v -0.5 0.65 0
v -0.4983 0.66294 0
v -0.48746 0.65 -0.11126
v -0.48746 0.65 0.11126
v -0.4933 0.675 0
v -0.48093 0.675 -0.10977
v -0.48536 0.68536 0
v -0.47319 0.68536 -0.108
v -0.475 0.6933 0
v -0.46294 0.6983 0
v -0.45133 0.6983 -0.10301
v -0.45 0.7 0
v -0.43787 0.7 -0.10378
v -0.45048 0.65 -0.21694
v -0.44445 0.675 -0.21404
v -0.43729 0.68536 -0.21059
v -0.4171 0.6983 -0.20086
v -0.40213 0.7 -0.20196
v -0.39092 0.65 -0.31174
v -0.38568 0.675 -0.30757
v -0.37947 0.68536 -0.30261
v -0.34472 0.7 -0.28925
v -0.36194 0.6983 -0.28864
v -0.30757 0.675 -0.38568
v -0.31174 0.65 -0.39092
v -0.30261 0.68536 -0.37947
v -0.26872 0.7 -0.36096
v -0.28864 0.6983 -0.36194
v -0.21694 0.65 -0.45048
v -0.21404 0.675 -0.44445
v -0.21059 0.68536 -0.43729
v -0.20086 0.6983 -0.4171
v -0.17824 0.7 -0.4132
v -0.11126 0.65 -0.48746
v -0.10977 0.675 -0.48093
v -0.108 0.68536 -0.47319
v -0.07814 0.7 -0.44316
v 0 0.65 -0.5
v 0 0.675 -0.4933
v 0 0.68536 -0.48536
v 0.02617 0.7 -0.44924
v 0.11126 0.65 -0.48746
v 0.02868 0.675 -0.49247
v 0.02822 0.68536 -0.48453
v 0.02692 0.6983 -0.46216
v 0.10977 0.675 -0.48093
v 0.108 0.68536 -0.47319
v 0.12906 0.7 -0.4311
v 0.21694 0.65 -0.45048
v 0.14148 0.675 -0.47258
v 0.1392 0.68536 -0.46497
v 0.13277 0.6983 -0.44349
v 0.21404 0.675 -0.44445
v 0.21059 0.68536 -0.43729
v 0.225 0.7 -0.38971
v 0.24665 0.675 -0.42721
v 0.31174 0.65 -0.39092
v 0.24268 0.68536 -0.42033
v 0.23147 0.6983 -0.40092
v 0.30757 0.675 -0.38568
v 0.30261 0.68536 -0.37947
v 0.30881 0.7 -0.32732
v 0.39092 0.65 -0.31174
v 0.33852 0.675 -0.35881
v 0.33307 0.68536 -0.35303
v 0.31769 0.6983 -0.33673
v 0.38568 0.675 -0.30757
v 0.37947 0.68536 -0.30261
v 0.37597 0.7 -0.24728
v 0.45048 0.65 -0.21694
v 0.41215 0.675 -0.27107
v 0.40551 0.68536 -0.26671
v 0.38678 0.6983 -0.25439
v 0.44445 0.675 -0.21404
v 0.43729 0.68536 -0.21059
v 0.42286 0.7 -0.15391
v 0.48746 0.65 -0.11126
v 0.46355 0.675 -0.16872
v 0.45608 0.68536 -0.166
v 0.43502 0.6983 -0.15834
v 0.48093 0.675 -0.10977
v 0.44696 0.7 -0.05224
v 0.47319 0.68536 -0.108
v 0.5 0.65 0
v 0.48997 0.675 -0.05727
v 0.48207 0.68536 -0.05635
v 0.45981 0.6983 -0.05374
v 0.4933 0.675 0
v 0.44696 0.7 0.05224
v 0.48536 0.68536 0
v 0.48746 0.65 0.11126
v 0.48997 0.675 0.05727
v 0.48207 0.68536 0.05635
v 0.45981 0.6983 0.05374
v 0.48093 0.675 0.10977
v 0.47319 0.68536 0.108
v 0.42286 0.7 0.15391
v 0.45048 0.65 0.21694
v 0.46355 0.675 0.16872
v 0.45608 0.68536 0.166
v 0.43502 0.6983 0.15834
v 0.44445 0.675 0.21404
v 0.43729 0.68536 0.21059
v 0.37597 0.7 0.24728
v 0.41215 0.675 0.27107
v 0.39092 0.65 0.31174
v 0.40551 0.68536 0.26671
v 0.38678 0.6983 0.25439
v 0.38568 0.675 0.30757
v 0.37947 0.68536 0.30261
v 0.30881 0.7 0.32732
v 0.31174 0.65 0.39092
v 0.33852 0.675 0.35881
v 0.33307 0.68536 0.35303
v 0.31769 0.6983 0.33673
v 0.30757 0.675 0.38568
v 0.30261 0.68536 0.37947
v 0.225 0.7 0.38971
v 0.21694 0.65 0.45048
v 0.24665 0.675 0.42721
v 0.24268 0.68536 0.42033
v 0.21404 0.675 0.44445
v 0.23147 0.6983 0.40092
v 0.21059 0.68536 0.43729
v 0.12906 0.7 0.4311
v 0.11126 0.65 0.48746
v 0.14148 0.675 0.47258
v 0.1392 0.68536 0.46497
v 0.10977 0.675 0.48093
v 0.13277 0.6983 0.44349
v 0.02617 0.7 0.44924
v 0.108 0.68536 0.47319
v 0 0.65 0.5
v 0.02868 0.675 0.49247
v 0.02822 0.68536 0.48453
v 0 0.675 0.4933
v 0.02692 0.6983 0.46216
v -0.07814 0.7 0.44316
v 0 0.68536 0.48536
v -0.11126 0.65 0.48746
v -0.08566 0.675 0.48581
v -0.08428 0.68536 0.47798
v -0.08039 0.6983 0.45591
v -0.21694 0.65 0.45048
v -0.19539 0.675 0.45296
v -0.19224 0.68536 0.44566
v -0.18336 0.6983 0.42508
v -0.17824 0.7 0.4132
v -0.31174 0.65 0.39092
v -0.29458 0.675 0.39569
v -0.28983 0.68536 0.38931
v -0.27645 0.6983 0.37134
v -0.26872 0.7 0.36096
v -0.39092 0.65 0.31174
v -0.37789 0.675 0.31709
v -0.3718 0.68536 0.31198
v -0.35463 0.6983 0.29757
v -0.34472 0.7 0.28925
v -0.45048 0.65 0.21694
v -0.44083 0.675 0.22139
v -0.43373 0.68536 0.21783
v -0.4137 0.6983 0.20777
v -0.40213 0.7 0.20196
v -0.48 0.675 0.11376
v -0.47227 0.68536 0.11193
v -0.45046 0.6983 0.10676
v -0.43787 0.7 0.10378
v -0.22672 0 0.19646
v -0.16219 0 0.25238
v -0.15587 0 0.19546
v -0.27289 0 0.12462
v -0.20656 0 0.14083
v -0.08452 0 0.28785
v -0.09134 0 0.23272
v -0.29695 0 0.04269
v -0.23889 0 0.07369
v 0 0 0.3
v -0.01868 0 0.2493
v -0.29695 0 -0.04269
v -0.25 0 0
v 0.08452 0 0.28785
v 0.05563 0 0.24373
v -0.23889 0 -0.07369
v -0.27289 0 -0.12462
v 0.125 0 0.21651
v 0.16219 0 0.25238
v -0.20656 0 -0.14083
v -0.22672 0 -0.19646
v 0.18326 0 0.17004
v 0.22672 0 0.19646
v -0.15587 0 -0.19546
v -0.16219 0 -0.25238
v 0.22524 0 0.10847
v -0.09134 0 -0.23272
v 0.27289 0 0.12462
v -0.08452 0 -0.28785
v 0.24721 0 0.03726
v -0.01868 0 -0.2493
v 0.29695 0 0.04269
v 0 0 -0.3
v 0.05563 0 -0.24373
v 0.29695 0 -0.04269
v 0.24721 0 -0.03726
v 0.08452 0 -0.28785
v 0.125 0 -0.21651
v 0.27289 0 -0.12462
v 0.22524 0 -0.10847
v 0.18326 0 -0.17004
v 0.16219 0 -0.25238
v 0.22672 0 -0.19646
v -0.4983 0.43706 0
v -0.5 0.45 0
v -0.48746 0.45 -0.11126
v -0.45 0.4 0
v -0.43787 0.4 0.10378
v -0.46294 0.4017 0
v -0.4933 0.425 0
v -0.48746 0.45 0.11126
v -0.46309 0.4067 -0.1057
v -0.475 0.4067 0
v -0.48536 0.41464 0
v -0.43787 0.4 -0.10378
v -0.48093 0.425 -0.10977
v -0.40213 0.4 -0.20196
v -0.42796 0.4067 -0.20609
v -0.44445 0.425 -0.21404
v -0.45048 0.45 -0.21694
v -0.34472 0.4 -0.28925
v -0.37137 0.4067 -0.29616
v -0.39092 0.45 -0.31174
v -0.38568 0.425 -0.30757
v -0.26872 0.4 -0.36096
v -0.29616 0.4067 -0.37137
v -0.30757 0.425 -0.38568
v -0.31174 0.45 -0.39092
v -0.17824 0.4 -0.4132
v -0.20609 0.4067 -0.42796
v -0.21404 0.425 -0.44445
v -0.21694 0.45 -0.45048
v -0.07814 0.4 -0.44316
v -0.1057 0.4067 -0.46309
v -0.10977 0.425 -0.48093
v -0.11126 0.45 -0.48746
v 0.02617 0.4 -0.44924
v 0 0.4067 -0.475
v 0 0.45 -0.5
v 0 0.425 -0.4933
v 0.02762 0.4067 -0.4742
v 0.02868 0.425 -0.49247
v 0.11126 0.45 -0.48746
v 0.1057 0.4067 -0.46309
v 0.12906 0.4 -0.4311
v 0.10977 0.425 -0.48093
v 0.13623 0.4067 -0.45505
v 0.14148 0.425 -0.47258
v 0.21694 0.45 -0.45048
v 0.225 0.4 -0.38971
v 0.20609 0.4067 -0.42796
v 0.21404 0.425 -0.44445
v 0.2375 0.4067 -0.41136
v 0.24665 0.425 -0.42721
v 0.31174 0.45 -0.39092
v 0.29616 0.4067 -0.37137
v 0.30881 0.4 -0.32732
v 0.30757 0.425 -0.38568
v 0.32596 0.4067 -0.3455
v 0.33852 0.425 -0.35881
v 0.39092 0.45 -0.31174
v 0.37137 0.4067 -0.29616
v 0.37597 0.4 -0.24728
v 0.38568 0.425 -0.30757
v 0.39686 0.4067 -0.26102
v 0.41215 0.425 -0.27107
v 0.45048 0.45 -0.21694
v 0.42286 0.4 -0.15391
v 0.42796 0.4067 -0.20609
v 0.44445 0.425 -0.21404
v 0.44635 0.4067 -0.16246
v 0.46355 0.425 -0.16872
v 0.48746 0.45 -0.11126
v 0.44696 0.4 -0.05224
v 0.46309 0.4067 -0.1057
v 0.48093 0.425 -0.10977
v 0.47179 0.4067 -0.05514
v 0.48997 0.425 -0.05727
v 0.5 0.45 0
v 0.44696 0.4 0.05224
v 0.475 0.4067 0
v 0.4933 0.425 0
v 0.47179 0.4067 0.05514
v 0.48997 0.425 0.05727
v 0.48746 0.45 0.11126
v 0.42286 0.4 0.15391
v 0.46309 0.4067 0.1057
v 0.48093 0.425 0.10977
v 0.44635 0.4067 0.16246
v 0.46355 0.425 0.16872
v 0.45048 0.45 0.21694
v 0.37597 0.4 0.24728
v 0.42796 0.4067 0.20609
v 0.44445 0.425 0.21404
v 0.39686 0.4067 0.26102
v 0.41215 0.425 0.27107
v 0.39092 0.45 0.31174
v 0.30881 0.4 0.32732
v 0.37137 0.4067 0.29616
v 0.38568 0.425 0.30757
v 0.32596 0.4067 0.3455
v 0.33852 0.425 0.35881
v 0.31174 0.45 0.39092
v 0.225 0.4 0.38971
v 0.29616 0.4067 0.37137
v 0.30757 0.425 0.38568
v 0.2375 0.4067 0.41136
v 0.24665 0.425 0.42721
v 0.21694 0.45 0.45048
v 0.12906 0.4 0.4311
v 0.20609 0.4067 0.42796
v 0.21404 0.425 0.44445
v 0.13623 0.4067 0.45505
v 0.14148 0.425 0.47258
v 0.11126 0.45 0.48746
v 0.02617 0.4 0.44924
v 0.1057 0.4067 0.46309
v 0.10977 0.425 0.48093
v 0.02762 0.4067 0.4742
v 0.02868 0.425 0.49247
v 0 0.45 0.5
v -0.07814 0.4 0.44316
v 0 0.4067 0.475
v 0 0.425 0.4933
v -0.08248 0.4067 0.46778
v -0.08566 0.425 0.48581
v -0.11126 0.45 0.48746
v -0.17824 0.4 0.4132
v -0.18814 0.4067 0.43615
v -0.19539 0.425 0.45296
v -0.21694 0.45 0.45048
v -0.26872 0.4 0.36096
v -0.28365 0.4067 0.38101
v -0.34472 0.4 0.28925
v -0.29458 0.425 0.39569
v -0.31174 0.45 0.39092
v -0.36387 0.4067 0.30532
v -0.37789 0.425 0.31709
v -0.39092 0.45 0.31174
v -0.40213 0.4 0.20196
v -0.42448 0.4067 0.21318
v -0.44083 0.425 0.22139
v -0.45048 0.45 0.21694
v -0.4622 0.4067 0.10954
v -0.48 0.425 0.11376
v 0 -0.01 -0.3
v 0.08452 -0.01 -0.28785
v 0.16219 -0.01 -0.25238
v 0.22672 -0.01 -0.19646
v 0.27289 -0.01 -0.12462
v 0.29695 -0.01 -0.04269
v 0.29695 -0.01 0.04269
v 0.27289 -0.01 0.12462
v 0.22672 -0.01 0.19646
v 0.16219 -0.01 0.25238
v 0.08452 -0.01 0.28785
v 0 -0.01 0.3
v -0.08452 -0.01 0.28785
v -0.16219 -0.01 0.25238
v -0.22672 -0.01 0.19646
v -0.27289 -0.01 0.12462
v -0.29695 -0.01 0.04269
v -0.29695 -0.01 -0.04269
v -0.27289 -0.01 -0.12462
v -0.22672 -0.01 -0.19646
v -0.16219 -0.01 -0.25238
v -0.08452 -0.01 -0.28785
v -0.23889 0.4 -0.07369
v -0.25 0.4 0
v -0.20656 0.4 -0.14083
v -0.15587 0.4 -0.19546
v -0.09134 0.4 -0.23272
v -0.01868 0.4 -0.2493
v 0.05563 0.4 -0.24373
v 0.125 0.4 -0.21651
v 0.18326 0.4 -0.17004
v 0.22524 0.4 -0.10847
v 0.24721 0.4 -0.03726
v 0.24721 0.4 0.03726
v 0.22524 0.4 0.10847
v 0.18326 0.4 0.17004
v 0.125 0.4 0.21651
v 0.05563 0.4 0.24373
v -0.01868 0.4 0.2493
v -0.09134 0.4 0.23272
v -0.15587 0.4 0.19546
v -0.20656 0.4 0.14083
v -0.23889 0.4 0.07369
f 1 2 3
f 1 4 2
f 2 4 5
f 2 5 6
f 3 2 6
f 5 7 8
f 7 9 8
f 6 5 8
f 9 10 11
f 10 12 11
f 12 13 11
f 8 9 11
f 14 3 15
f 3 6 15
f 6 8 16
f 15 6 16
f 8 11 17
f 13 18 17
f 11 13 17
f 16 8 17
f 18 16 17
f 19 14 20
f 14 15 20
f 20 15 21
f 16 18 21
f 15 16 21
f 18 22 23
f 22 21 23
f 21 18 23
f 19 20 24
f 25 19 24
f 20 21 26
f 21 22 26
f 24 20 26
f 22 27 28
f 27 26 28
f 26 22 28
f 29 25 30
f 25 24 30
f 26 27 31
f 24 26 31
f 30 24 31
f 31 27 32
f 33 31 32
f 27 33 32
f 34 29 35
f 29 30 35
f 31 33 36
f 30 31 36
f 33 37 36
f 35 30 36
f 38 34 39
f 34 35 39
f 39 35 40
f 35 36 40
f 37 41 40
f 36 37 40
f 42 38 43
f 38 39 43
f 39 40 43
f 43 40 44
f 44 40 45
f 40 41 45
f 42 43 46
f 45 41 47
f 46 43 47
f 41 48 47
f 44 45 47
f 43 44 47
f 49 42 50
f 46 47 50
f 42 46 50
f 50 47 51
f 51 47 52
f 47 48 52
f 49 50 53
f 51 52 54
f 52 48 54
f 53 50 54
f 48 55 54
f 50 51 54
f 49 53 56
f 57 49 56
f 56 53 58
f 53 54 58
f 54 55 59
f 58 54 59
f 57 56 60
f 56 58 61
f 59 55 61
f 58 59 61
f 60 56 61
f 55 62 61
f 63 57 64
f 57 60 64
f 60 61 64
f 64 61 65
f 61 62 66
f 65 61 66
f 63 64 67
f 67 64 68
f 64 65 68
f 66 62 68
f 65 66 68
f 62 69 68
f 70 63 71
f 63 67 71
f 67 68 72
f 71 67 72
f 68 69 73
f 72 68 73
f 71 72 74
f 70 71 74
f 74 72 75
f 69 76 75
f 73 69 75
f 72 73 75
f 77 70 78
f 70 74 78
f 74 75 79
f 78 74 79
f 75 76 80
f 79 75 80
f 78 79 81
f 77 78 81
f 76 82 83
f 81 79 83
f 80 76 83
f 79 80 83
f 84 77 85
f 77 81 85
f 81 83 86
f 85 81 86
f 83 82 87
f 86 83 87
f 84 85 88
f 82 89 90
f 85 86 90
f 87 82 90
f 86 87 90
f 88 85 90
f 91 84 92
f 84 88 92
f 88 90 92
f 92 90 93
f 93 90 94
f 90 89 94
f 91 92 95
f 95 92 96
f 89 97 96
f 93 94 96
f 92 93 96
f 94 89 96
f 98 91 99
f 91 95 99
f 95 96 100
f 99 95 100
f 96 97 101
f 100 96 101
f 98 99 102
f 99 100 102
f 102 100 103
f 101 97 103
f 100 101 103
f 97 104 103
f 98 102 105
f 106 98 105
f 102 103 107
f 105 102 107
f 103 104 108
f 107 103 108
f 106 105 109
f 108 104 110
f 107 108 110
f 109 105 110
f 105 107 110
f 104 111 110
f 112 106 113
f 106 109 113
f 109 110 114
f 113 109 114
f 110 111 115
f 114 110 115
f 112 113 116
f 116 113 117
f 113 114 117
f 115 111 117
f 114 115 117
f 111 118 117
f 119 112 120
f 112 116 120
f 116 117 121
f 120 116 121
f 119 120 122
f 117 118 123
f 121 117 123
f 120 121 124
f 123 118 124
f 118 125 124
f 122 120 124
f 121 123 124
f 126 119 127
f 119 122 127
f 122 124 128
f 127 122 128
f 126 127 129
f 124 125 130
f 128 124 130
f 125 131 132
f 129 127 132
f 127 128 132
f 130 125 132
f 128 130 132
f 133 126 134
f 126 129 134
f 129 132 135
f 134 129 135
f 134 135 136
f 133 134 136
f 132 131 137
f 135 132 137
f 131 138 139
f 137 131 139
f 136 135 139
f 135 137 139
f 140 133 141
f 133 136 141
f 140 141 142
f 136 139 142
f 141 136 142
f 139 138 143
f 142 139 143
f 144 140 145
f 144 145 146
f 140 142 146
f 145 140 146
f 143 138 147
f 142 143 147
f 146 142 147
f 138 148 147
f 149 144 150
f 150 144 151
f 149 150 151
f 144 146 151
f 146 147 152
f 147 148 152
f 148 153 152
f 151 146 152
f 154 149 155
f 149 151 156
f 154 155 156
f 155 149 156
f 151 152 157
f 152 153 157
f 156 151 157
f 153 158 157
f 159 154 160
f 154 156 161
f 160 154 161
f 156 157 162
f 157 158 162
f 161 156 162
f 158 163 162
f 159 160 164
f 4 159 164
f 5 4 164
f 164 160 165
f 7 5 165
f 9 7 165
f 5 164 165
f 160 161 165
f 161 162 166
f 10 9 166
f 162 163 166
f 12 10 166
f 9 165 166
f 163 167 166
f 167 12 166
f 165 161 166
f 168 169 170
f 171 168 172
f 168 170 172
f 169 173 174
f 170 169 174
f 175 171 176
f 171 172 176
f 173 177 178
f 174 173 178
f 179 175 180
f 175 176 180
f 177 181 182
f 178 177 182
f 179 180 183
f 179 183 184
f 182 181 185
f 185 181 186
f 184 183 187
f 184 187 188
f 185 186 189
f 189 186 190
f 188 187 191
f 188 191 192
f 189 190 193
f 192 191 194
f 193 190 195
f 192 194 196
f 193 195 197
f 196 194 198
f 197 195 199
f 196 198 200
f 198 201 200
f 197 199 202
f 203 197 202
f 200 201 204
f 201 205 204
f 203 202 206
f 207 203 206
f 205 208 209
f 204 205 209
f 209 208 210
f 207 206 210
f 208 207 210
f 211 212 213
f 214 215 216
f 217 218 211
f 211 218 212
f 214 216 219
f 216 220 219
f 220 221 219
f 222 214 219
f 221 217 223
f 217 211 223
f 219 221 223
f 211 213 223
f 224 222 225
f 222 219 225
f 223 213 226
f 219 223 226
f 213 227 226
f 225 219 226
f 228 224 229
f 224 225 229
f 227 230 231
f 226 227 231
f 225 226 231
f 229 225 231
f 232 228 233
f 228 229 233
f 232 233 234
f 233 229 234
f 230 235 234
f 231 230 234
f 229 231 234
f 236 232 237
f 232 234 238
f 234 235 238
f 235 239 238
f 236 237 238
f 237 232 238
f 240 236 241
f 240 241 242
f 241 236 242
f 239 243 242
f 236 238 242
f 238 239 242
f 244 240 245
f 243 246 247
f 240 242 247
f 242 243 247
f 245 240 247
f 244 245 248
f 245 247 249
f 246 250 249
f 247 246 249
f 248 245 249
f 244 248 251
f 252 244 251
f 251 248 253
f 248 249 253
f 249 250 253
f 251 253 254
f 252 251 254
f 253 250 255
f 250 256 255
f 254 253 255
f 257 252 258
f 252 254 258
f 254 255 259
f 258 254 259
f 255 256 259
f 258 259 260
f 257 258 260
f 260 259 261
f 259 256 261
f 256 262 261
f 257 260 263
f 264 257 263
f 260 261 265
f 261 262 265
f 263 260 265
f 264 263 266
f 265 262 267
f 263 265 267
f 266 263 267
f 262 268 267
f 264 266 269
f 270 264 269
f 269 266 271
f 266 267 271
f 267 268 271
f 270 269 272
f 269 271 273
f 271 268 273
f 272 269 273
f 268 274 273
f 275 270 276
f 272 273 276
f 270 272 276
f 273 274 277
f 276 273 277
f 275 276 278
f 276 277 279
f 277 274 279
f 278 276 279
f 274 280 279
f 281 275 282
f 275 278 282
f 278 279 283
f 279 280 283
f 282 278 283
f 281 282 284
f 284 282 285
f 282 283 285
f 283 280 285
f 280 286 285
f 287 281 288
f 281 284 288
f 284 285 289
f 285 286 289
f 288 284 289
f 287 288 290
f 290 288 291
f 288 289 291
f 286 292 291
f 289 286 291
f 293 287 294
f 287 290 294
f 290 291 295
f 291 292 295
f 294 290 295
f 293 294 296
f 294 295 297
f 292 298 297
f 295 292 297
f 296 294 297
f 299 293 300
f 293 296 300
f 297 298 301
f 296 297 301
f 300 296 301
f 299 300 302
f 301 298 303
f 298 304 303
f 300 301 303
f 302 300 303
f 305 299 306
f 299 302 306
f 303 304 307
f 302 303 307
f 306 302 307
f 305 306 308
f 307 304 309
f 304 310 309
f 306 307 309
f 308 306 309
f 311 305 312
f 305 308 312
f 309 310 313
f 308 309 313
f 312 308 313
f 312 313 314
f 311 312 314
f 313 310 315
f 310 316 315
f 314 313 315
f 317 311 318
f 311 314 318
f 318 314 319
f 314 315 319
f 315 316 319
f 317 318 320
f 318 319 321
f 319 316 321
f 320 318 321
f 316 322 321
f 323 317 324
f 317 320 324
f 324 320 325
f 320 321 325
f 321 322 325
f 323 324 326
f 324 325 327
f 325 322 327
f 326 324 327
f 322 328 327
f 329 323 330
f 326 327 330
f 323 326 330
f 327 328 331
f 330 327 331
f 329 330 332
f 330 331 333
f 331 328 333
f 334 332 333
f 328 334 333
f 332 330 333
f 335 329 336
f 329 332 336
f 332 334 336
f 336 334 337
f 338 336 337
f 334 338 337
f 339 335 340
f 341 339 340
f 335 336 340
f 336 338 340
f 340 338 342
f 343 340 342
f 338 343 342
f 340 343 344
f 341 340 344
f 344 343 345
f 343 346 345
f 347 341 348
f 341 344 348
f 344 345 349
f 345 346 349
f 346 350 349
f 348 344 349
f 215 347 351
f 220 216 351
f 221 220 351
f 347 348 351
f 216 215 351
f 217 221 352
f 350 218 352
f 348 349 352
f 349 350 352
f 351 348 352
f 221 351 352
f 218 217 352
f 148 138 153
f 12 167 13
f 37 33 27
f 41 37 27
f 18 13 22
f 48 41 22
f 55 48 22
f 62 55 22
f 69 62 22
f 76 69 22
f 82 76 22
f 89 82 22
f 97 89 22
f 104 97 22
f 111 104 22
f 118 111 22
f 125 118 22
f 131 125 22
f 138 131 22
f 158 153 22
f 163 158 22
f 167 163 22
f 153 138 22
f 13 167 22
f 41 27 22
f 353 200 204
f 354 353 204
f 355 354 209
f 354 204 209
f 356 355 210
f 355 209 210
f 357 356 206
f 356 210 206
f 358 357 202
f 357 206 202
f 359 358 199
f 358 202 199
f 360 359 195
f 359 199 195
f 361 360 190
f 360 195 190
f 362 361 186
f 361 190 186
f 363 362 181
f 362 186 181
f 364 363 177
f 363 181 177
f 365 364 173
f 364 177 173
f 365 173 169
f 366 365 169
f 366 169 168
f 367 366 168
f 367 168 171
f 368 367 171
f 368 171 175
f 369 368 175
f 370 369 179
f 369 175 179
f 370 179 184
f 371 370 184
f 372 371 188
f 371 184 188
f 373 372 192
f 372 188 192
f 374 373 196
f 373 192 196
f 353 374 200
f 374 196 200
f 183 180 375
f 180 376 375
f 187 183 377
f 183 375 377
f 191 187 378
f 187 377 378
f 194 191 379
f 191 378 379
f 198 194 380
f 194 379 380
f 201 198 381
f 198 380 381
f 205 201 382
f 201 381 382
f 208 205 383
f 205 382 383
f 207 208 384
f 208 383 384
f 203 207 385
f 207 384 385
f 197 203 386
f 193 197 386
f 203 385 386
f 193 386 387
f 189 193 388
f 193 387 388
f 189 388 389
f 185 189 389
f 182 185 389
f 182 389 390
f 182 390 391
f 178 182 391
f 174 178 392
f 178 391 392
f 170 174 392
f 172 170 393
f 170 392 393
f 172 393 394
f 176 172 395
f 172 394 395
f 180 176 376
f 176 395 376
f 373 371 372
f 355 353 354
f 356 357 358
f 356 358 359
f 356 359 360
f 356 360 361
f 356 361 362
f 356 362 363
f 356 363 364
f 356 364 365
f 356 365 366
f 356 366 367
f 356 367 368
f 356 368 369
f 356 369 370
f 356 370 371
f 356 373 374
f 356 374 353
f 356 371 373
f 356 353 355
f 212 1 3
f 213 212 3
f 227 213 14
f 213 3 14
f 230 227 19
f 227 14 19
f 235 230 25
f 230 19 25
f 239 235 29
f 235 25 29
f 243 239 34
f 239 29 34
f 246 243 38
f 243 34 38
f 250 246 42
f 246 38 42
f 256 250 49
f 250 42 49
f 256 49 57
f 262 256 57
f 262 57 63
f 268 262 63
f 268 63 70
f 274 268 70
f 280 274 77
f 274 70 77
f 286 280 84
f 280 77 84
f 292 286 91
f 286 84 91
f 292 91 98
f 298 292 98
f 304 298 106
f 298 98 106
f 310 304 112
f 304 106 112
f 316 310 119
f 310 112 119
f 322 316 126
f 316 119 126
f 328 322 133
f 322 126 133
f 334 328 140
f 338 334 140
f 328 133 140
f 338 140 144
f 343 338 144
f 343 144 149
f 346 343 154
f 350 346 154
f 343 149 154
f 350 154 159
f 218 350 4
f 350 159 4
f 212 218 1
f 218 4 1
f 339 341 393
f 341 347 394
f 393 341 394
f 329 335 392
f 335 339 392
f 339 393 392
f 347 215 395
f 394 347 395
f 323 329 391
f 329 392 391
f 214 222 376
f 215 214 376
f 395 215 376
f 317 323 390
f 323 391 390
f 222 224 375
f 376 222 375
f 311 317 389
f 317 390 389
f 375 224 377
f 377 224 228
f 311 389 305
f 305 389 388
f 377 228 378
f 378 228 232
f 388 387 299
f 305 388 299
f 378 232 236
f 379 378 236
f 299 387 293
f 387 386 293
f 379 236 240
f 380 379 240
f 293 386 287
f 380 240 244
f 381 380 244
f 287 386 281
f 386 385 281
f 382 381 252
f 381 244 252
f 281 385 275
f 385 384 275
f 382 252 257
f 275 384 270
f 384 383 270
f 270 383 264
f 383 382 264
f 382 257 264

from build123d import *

# Parameters (mm, degrees)
FILLET1_R           = 0.05
SKETCH2_R           = 0.3
BOSS_EXTRUDE1_DEPTH = 0.01


with BuildPart() as part:
    # Sketch1 → Revolve1 (revolve)
    with BuildSketch(Plane.XY, mode=Mode.PRIVATE) as revolve1_sk:
        Polygon((0, 0), (0.25, 0), (0.25, 0.4), (0.5, 0.4), (0.5, 0.7), (0, 0.7), align=None)
    revolve(revolve1_sk.sketch.rotate(Axis((0, 0.7, 0), (0, -1, 0)), 180), axis=Axis((0, 0.7, 0), (0, -1, 0)))

    # Fillet1
    fillet1_edges = [part.edges().sort_by_distance(p)[0] for p in [
        (0.5, 0.7, 0),
        (0.5, 0.4, 0),
    ]]
    fillet(fillet1_edges, radius=FILLET1_R)

    # Sketch2 → Boss-Extrude1 (add)
    with BuildSketch(Plane(origin=(0, 0, 0), x_dir=(-1, 0, 0), z_dir=(0, -1, 0))):
        with Locations(Location((0, 0, 0), (0, 0, 90))):
            Circle(SKETCH2_R)
    extrude(amount=BOSS_EXTRUDE1_DEPTH)


solid = part.part
